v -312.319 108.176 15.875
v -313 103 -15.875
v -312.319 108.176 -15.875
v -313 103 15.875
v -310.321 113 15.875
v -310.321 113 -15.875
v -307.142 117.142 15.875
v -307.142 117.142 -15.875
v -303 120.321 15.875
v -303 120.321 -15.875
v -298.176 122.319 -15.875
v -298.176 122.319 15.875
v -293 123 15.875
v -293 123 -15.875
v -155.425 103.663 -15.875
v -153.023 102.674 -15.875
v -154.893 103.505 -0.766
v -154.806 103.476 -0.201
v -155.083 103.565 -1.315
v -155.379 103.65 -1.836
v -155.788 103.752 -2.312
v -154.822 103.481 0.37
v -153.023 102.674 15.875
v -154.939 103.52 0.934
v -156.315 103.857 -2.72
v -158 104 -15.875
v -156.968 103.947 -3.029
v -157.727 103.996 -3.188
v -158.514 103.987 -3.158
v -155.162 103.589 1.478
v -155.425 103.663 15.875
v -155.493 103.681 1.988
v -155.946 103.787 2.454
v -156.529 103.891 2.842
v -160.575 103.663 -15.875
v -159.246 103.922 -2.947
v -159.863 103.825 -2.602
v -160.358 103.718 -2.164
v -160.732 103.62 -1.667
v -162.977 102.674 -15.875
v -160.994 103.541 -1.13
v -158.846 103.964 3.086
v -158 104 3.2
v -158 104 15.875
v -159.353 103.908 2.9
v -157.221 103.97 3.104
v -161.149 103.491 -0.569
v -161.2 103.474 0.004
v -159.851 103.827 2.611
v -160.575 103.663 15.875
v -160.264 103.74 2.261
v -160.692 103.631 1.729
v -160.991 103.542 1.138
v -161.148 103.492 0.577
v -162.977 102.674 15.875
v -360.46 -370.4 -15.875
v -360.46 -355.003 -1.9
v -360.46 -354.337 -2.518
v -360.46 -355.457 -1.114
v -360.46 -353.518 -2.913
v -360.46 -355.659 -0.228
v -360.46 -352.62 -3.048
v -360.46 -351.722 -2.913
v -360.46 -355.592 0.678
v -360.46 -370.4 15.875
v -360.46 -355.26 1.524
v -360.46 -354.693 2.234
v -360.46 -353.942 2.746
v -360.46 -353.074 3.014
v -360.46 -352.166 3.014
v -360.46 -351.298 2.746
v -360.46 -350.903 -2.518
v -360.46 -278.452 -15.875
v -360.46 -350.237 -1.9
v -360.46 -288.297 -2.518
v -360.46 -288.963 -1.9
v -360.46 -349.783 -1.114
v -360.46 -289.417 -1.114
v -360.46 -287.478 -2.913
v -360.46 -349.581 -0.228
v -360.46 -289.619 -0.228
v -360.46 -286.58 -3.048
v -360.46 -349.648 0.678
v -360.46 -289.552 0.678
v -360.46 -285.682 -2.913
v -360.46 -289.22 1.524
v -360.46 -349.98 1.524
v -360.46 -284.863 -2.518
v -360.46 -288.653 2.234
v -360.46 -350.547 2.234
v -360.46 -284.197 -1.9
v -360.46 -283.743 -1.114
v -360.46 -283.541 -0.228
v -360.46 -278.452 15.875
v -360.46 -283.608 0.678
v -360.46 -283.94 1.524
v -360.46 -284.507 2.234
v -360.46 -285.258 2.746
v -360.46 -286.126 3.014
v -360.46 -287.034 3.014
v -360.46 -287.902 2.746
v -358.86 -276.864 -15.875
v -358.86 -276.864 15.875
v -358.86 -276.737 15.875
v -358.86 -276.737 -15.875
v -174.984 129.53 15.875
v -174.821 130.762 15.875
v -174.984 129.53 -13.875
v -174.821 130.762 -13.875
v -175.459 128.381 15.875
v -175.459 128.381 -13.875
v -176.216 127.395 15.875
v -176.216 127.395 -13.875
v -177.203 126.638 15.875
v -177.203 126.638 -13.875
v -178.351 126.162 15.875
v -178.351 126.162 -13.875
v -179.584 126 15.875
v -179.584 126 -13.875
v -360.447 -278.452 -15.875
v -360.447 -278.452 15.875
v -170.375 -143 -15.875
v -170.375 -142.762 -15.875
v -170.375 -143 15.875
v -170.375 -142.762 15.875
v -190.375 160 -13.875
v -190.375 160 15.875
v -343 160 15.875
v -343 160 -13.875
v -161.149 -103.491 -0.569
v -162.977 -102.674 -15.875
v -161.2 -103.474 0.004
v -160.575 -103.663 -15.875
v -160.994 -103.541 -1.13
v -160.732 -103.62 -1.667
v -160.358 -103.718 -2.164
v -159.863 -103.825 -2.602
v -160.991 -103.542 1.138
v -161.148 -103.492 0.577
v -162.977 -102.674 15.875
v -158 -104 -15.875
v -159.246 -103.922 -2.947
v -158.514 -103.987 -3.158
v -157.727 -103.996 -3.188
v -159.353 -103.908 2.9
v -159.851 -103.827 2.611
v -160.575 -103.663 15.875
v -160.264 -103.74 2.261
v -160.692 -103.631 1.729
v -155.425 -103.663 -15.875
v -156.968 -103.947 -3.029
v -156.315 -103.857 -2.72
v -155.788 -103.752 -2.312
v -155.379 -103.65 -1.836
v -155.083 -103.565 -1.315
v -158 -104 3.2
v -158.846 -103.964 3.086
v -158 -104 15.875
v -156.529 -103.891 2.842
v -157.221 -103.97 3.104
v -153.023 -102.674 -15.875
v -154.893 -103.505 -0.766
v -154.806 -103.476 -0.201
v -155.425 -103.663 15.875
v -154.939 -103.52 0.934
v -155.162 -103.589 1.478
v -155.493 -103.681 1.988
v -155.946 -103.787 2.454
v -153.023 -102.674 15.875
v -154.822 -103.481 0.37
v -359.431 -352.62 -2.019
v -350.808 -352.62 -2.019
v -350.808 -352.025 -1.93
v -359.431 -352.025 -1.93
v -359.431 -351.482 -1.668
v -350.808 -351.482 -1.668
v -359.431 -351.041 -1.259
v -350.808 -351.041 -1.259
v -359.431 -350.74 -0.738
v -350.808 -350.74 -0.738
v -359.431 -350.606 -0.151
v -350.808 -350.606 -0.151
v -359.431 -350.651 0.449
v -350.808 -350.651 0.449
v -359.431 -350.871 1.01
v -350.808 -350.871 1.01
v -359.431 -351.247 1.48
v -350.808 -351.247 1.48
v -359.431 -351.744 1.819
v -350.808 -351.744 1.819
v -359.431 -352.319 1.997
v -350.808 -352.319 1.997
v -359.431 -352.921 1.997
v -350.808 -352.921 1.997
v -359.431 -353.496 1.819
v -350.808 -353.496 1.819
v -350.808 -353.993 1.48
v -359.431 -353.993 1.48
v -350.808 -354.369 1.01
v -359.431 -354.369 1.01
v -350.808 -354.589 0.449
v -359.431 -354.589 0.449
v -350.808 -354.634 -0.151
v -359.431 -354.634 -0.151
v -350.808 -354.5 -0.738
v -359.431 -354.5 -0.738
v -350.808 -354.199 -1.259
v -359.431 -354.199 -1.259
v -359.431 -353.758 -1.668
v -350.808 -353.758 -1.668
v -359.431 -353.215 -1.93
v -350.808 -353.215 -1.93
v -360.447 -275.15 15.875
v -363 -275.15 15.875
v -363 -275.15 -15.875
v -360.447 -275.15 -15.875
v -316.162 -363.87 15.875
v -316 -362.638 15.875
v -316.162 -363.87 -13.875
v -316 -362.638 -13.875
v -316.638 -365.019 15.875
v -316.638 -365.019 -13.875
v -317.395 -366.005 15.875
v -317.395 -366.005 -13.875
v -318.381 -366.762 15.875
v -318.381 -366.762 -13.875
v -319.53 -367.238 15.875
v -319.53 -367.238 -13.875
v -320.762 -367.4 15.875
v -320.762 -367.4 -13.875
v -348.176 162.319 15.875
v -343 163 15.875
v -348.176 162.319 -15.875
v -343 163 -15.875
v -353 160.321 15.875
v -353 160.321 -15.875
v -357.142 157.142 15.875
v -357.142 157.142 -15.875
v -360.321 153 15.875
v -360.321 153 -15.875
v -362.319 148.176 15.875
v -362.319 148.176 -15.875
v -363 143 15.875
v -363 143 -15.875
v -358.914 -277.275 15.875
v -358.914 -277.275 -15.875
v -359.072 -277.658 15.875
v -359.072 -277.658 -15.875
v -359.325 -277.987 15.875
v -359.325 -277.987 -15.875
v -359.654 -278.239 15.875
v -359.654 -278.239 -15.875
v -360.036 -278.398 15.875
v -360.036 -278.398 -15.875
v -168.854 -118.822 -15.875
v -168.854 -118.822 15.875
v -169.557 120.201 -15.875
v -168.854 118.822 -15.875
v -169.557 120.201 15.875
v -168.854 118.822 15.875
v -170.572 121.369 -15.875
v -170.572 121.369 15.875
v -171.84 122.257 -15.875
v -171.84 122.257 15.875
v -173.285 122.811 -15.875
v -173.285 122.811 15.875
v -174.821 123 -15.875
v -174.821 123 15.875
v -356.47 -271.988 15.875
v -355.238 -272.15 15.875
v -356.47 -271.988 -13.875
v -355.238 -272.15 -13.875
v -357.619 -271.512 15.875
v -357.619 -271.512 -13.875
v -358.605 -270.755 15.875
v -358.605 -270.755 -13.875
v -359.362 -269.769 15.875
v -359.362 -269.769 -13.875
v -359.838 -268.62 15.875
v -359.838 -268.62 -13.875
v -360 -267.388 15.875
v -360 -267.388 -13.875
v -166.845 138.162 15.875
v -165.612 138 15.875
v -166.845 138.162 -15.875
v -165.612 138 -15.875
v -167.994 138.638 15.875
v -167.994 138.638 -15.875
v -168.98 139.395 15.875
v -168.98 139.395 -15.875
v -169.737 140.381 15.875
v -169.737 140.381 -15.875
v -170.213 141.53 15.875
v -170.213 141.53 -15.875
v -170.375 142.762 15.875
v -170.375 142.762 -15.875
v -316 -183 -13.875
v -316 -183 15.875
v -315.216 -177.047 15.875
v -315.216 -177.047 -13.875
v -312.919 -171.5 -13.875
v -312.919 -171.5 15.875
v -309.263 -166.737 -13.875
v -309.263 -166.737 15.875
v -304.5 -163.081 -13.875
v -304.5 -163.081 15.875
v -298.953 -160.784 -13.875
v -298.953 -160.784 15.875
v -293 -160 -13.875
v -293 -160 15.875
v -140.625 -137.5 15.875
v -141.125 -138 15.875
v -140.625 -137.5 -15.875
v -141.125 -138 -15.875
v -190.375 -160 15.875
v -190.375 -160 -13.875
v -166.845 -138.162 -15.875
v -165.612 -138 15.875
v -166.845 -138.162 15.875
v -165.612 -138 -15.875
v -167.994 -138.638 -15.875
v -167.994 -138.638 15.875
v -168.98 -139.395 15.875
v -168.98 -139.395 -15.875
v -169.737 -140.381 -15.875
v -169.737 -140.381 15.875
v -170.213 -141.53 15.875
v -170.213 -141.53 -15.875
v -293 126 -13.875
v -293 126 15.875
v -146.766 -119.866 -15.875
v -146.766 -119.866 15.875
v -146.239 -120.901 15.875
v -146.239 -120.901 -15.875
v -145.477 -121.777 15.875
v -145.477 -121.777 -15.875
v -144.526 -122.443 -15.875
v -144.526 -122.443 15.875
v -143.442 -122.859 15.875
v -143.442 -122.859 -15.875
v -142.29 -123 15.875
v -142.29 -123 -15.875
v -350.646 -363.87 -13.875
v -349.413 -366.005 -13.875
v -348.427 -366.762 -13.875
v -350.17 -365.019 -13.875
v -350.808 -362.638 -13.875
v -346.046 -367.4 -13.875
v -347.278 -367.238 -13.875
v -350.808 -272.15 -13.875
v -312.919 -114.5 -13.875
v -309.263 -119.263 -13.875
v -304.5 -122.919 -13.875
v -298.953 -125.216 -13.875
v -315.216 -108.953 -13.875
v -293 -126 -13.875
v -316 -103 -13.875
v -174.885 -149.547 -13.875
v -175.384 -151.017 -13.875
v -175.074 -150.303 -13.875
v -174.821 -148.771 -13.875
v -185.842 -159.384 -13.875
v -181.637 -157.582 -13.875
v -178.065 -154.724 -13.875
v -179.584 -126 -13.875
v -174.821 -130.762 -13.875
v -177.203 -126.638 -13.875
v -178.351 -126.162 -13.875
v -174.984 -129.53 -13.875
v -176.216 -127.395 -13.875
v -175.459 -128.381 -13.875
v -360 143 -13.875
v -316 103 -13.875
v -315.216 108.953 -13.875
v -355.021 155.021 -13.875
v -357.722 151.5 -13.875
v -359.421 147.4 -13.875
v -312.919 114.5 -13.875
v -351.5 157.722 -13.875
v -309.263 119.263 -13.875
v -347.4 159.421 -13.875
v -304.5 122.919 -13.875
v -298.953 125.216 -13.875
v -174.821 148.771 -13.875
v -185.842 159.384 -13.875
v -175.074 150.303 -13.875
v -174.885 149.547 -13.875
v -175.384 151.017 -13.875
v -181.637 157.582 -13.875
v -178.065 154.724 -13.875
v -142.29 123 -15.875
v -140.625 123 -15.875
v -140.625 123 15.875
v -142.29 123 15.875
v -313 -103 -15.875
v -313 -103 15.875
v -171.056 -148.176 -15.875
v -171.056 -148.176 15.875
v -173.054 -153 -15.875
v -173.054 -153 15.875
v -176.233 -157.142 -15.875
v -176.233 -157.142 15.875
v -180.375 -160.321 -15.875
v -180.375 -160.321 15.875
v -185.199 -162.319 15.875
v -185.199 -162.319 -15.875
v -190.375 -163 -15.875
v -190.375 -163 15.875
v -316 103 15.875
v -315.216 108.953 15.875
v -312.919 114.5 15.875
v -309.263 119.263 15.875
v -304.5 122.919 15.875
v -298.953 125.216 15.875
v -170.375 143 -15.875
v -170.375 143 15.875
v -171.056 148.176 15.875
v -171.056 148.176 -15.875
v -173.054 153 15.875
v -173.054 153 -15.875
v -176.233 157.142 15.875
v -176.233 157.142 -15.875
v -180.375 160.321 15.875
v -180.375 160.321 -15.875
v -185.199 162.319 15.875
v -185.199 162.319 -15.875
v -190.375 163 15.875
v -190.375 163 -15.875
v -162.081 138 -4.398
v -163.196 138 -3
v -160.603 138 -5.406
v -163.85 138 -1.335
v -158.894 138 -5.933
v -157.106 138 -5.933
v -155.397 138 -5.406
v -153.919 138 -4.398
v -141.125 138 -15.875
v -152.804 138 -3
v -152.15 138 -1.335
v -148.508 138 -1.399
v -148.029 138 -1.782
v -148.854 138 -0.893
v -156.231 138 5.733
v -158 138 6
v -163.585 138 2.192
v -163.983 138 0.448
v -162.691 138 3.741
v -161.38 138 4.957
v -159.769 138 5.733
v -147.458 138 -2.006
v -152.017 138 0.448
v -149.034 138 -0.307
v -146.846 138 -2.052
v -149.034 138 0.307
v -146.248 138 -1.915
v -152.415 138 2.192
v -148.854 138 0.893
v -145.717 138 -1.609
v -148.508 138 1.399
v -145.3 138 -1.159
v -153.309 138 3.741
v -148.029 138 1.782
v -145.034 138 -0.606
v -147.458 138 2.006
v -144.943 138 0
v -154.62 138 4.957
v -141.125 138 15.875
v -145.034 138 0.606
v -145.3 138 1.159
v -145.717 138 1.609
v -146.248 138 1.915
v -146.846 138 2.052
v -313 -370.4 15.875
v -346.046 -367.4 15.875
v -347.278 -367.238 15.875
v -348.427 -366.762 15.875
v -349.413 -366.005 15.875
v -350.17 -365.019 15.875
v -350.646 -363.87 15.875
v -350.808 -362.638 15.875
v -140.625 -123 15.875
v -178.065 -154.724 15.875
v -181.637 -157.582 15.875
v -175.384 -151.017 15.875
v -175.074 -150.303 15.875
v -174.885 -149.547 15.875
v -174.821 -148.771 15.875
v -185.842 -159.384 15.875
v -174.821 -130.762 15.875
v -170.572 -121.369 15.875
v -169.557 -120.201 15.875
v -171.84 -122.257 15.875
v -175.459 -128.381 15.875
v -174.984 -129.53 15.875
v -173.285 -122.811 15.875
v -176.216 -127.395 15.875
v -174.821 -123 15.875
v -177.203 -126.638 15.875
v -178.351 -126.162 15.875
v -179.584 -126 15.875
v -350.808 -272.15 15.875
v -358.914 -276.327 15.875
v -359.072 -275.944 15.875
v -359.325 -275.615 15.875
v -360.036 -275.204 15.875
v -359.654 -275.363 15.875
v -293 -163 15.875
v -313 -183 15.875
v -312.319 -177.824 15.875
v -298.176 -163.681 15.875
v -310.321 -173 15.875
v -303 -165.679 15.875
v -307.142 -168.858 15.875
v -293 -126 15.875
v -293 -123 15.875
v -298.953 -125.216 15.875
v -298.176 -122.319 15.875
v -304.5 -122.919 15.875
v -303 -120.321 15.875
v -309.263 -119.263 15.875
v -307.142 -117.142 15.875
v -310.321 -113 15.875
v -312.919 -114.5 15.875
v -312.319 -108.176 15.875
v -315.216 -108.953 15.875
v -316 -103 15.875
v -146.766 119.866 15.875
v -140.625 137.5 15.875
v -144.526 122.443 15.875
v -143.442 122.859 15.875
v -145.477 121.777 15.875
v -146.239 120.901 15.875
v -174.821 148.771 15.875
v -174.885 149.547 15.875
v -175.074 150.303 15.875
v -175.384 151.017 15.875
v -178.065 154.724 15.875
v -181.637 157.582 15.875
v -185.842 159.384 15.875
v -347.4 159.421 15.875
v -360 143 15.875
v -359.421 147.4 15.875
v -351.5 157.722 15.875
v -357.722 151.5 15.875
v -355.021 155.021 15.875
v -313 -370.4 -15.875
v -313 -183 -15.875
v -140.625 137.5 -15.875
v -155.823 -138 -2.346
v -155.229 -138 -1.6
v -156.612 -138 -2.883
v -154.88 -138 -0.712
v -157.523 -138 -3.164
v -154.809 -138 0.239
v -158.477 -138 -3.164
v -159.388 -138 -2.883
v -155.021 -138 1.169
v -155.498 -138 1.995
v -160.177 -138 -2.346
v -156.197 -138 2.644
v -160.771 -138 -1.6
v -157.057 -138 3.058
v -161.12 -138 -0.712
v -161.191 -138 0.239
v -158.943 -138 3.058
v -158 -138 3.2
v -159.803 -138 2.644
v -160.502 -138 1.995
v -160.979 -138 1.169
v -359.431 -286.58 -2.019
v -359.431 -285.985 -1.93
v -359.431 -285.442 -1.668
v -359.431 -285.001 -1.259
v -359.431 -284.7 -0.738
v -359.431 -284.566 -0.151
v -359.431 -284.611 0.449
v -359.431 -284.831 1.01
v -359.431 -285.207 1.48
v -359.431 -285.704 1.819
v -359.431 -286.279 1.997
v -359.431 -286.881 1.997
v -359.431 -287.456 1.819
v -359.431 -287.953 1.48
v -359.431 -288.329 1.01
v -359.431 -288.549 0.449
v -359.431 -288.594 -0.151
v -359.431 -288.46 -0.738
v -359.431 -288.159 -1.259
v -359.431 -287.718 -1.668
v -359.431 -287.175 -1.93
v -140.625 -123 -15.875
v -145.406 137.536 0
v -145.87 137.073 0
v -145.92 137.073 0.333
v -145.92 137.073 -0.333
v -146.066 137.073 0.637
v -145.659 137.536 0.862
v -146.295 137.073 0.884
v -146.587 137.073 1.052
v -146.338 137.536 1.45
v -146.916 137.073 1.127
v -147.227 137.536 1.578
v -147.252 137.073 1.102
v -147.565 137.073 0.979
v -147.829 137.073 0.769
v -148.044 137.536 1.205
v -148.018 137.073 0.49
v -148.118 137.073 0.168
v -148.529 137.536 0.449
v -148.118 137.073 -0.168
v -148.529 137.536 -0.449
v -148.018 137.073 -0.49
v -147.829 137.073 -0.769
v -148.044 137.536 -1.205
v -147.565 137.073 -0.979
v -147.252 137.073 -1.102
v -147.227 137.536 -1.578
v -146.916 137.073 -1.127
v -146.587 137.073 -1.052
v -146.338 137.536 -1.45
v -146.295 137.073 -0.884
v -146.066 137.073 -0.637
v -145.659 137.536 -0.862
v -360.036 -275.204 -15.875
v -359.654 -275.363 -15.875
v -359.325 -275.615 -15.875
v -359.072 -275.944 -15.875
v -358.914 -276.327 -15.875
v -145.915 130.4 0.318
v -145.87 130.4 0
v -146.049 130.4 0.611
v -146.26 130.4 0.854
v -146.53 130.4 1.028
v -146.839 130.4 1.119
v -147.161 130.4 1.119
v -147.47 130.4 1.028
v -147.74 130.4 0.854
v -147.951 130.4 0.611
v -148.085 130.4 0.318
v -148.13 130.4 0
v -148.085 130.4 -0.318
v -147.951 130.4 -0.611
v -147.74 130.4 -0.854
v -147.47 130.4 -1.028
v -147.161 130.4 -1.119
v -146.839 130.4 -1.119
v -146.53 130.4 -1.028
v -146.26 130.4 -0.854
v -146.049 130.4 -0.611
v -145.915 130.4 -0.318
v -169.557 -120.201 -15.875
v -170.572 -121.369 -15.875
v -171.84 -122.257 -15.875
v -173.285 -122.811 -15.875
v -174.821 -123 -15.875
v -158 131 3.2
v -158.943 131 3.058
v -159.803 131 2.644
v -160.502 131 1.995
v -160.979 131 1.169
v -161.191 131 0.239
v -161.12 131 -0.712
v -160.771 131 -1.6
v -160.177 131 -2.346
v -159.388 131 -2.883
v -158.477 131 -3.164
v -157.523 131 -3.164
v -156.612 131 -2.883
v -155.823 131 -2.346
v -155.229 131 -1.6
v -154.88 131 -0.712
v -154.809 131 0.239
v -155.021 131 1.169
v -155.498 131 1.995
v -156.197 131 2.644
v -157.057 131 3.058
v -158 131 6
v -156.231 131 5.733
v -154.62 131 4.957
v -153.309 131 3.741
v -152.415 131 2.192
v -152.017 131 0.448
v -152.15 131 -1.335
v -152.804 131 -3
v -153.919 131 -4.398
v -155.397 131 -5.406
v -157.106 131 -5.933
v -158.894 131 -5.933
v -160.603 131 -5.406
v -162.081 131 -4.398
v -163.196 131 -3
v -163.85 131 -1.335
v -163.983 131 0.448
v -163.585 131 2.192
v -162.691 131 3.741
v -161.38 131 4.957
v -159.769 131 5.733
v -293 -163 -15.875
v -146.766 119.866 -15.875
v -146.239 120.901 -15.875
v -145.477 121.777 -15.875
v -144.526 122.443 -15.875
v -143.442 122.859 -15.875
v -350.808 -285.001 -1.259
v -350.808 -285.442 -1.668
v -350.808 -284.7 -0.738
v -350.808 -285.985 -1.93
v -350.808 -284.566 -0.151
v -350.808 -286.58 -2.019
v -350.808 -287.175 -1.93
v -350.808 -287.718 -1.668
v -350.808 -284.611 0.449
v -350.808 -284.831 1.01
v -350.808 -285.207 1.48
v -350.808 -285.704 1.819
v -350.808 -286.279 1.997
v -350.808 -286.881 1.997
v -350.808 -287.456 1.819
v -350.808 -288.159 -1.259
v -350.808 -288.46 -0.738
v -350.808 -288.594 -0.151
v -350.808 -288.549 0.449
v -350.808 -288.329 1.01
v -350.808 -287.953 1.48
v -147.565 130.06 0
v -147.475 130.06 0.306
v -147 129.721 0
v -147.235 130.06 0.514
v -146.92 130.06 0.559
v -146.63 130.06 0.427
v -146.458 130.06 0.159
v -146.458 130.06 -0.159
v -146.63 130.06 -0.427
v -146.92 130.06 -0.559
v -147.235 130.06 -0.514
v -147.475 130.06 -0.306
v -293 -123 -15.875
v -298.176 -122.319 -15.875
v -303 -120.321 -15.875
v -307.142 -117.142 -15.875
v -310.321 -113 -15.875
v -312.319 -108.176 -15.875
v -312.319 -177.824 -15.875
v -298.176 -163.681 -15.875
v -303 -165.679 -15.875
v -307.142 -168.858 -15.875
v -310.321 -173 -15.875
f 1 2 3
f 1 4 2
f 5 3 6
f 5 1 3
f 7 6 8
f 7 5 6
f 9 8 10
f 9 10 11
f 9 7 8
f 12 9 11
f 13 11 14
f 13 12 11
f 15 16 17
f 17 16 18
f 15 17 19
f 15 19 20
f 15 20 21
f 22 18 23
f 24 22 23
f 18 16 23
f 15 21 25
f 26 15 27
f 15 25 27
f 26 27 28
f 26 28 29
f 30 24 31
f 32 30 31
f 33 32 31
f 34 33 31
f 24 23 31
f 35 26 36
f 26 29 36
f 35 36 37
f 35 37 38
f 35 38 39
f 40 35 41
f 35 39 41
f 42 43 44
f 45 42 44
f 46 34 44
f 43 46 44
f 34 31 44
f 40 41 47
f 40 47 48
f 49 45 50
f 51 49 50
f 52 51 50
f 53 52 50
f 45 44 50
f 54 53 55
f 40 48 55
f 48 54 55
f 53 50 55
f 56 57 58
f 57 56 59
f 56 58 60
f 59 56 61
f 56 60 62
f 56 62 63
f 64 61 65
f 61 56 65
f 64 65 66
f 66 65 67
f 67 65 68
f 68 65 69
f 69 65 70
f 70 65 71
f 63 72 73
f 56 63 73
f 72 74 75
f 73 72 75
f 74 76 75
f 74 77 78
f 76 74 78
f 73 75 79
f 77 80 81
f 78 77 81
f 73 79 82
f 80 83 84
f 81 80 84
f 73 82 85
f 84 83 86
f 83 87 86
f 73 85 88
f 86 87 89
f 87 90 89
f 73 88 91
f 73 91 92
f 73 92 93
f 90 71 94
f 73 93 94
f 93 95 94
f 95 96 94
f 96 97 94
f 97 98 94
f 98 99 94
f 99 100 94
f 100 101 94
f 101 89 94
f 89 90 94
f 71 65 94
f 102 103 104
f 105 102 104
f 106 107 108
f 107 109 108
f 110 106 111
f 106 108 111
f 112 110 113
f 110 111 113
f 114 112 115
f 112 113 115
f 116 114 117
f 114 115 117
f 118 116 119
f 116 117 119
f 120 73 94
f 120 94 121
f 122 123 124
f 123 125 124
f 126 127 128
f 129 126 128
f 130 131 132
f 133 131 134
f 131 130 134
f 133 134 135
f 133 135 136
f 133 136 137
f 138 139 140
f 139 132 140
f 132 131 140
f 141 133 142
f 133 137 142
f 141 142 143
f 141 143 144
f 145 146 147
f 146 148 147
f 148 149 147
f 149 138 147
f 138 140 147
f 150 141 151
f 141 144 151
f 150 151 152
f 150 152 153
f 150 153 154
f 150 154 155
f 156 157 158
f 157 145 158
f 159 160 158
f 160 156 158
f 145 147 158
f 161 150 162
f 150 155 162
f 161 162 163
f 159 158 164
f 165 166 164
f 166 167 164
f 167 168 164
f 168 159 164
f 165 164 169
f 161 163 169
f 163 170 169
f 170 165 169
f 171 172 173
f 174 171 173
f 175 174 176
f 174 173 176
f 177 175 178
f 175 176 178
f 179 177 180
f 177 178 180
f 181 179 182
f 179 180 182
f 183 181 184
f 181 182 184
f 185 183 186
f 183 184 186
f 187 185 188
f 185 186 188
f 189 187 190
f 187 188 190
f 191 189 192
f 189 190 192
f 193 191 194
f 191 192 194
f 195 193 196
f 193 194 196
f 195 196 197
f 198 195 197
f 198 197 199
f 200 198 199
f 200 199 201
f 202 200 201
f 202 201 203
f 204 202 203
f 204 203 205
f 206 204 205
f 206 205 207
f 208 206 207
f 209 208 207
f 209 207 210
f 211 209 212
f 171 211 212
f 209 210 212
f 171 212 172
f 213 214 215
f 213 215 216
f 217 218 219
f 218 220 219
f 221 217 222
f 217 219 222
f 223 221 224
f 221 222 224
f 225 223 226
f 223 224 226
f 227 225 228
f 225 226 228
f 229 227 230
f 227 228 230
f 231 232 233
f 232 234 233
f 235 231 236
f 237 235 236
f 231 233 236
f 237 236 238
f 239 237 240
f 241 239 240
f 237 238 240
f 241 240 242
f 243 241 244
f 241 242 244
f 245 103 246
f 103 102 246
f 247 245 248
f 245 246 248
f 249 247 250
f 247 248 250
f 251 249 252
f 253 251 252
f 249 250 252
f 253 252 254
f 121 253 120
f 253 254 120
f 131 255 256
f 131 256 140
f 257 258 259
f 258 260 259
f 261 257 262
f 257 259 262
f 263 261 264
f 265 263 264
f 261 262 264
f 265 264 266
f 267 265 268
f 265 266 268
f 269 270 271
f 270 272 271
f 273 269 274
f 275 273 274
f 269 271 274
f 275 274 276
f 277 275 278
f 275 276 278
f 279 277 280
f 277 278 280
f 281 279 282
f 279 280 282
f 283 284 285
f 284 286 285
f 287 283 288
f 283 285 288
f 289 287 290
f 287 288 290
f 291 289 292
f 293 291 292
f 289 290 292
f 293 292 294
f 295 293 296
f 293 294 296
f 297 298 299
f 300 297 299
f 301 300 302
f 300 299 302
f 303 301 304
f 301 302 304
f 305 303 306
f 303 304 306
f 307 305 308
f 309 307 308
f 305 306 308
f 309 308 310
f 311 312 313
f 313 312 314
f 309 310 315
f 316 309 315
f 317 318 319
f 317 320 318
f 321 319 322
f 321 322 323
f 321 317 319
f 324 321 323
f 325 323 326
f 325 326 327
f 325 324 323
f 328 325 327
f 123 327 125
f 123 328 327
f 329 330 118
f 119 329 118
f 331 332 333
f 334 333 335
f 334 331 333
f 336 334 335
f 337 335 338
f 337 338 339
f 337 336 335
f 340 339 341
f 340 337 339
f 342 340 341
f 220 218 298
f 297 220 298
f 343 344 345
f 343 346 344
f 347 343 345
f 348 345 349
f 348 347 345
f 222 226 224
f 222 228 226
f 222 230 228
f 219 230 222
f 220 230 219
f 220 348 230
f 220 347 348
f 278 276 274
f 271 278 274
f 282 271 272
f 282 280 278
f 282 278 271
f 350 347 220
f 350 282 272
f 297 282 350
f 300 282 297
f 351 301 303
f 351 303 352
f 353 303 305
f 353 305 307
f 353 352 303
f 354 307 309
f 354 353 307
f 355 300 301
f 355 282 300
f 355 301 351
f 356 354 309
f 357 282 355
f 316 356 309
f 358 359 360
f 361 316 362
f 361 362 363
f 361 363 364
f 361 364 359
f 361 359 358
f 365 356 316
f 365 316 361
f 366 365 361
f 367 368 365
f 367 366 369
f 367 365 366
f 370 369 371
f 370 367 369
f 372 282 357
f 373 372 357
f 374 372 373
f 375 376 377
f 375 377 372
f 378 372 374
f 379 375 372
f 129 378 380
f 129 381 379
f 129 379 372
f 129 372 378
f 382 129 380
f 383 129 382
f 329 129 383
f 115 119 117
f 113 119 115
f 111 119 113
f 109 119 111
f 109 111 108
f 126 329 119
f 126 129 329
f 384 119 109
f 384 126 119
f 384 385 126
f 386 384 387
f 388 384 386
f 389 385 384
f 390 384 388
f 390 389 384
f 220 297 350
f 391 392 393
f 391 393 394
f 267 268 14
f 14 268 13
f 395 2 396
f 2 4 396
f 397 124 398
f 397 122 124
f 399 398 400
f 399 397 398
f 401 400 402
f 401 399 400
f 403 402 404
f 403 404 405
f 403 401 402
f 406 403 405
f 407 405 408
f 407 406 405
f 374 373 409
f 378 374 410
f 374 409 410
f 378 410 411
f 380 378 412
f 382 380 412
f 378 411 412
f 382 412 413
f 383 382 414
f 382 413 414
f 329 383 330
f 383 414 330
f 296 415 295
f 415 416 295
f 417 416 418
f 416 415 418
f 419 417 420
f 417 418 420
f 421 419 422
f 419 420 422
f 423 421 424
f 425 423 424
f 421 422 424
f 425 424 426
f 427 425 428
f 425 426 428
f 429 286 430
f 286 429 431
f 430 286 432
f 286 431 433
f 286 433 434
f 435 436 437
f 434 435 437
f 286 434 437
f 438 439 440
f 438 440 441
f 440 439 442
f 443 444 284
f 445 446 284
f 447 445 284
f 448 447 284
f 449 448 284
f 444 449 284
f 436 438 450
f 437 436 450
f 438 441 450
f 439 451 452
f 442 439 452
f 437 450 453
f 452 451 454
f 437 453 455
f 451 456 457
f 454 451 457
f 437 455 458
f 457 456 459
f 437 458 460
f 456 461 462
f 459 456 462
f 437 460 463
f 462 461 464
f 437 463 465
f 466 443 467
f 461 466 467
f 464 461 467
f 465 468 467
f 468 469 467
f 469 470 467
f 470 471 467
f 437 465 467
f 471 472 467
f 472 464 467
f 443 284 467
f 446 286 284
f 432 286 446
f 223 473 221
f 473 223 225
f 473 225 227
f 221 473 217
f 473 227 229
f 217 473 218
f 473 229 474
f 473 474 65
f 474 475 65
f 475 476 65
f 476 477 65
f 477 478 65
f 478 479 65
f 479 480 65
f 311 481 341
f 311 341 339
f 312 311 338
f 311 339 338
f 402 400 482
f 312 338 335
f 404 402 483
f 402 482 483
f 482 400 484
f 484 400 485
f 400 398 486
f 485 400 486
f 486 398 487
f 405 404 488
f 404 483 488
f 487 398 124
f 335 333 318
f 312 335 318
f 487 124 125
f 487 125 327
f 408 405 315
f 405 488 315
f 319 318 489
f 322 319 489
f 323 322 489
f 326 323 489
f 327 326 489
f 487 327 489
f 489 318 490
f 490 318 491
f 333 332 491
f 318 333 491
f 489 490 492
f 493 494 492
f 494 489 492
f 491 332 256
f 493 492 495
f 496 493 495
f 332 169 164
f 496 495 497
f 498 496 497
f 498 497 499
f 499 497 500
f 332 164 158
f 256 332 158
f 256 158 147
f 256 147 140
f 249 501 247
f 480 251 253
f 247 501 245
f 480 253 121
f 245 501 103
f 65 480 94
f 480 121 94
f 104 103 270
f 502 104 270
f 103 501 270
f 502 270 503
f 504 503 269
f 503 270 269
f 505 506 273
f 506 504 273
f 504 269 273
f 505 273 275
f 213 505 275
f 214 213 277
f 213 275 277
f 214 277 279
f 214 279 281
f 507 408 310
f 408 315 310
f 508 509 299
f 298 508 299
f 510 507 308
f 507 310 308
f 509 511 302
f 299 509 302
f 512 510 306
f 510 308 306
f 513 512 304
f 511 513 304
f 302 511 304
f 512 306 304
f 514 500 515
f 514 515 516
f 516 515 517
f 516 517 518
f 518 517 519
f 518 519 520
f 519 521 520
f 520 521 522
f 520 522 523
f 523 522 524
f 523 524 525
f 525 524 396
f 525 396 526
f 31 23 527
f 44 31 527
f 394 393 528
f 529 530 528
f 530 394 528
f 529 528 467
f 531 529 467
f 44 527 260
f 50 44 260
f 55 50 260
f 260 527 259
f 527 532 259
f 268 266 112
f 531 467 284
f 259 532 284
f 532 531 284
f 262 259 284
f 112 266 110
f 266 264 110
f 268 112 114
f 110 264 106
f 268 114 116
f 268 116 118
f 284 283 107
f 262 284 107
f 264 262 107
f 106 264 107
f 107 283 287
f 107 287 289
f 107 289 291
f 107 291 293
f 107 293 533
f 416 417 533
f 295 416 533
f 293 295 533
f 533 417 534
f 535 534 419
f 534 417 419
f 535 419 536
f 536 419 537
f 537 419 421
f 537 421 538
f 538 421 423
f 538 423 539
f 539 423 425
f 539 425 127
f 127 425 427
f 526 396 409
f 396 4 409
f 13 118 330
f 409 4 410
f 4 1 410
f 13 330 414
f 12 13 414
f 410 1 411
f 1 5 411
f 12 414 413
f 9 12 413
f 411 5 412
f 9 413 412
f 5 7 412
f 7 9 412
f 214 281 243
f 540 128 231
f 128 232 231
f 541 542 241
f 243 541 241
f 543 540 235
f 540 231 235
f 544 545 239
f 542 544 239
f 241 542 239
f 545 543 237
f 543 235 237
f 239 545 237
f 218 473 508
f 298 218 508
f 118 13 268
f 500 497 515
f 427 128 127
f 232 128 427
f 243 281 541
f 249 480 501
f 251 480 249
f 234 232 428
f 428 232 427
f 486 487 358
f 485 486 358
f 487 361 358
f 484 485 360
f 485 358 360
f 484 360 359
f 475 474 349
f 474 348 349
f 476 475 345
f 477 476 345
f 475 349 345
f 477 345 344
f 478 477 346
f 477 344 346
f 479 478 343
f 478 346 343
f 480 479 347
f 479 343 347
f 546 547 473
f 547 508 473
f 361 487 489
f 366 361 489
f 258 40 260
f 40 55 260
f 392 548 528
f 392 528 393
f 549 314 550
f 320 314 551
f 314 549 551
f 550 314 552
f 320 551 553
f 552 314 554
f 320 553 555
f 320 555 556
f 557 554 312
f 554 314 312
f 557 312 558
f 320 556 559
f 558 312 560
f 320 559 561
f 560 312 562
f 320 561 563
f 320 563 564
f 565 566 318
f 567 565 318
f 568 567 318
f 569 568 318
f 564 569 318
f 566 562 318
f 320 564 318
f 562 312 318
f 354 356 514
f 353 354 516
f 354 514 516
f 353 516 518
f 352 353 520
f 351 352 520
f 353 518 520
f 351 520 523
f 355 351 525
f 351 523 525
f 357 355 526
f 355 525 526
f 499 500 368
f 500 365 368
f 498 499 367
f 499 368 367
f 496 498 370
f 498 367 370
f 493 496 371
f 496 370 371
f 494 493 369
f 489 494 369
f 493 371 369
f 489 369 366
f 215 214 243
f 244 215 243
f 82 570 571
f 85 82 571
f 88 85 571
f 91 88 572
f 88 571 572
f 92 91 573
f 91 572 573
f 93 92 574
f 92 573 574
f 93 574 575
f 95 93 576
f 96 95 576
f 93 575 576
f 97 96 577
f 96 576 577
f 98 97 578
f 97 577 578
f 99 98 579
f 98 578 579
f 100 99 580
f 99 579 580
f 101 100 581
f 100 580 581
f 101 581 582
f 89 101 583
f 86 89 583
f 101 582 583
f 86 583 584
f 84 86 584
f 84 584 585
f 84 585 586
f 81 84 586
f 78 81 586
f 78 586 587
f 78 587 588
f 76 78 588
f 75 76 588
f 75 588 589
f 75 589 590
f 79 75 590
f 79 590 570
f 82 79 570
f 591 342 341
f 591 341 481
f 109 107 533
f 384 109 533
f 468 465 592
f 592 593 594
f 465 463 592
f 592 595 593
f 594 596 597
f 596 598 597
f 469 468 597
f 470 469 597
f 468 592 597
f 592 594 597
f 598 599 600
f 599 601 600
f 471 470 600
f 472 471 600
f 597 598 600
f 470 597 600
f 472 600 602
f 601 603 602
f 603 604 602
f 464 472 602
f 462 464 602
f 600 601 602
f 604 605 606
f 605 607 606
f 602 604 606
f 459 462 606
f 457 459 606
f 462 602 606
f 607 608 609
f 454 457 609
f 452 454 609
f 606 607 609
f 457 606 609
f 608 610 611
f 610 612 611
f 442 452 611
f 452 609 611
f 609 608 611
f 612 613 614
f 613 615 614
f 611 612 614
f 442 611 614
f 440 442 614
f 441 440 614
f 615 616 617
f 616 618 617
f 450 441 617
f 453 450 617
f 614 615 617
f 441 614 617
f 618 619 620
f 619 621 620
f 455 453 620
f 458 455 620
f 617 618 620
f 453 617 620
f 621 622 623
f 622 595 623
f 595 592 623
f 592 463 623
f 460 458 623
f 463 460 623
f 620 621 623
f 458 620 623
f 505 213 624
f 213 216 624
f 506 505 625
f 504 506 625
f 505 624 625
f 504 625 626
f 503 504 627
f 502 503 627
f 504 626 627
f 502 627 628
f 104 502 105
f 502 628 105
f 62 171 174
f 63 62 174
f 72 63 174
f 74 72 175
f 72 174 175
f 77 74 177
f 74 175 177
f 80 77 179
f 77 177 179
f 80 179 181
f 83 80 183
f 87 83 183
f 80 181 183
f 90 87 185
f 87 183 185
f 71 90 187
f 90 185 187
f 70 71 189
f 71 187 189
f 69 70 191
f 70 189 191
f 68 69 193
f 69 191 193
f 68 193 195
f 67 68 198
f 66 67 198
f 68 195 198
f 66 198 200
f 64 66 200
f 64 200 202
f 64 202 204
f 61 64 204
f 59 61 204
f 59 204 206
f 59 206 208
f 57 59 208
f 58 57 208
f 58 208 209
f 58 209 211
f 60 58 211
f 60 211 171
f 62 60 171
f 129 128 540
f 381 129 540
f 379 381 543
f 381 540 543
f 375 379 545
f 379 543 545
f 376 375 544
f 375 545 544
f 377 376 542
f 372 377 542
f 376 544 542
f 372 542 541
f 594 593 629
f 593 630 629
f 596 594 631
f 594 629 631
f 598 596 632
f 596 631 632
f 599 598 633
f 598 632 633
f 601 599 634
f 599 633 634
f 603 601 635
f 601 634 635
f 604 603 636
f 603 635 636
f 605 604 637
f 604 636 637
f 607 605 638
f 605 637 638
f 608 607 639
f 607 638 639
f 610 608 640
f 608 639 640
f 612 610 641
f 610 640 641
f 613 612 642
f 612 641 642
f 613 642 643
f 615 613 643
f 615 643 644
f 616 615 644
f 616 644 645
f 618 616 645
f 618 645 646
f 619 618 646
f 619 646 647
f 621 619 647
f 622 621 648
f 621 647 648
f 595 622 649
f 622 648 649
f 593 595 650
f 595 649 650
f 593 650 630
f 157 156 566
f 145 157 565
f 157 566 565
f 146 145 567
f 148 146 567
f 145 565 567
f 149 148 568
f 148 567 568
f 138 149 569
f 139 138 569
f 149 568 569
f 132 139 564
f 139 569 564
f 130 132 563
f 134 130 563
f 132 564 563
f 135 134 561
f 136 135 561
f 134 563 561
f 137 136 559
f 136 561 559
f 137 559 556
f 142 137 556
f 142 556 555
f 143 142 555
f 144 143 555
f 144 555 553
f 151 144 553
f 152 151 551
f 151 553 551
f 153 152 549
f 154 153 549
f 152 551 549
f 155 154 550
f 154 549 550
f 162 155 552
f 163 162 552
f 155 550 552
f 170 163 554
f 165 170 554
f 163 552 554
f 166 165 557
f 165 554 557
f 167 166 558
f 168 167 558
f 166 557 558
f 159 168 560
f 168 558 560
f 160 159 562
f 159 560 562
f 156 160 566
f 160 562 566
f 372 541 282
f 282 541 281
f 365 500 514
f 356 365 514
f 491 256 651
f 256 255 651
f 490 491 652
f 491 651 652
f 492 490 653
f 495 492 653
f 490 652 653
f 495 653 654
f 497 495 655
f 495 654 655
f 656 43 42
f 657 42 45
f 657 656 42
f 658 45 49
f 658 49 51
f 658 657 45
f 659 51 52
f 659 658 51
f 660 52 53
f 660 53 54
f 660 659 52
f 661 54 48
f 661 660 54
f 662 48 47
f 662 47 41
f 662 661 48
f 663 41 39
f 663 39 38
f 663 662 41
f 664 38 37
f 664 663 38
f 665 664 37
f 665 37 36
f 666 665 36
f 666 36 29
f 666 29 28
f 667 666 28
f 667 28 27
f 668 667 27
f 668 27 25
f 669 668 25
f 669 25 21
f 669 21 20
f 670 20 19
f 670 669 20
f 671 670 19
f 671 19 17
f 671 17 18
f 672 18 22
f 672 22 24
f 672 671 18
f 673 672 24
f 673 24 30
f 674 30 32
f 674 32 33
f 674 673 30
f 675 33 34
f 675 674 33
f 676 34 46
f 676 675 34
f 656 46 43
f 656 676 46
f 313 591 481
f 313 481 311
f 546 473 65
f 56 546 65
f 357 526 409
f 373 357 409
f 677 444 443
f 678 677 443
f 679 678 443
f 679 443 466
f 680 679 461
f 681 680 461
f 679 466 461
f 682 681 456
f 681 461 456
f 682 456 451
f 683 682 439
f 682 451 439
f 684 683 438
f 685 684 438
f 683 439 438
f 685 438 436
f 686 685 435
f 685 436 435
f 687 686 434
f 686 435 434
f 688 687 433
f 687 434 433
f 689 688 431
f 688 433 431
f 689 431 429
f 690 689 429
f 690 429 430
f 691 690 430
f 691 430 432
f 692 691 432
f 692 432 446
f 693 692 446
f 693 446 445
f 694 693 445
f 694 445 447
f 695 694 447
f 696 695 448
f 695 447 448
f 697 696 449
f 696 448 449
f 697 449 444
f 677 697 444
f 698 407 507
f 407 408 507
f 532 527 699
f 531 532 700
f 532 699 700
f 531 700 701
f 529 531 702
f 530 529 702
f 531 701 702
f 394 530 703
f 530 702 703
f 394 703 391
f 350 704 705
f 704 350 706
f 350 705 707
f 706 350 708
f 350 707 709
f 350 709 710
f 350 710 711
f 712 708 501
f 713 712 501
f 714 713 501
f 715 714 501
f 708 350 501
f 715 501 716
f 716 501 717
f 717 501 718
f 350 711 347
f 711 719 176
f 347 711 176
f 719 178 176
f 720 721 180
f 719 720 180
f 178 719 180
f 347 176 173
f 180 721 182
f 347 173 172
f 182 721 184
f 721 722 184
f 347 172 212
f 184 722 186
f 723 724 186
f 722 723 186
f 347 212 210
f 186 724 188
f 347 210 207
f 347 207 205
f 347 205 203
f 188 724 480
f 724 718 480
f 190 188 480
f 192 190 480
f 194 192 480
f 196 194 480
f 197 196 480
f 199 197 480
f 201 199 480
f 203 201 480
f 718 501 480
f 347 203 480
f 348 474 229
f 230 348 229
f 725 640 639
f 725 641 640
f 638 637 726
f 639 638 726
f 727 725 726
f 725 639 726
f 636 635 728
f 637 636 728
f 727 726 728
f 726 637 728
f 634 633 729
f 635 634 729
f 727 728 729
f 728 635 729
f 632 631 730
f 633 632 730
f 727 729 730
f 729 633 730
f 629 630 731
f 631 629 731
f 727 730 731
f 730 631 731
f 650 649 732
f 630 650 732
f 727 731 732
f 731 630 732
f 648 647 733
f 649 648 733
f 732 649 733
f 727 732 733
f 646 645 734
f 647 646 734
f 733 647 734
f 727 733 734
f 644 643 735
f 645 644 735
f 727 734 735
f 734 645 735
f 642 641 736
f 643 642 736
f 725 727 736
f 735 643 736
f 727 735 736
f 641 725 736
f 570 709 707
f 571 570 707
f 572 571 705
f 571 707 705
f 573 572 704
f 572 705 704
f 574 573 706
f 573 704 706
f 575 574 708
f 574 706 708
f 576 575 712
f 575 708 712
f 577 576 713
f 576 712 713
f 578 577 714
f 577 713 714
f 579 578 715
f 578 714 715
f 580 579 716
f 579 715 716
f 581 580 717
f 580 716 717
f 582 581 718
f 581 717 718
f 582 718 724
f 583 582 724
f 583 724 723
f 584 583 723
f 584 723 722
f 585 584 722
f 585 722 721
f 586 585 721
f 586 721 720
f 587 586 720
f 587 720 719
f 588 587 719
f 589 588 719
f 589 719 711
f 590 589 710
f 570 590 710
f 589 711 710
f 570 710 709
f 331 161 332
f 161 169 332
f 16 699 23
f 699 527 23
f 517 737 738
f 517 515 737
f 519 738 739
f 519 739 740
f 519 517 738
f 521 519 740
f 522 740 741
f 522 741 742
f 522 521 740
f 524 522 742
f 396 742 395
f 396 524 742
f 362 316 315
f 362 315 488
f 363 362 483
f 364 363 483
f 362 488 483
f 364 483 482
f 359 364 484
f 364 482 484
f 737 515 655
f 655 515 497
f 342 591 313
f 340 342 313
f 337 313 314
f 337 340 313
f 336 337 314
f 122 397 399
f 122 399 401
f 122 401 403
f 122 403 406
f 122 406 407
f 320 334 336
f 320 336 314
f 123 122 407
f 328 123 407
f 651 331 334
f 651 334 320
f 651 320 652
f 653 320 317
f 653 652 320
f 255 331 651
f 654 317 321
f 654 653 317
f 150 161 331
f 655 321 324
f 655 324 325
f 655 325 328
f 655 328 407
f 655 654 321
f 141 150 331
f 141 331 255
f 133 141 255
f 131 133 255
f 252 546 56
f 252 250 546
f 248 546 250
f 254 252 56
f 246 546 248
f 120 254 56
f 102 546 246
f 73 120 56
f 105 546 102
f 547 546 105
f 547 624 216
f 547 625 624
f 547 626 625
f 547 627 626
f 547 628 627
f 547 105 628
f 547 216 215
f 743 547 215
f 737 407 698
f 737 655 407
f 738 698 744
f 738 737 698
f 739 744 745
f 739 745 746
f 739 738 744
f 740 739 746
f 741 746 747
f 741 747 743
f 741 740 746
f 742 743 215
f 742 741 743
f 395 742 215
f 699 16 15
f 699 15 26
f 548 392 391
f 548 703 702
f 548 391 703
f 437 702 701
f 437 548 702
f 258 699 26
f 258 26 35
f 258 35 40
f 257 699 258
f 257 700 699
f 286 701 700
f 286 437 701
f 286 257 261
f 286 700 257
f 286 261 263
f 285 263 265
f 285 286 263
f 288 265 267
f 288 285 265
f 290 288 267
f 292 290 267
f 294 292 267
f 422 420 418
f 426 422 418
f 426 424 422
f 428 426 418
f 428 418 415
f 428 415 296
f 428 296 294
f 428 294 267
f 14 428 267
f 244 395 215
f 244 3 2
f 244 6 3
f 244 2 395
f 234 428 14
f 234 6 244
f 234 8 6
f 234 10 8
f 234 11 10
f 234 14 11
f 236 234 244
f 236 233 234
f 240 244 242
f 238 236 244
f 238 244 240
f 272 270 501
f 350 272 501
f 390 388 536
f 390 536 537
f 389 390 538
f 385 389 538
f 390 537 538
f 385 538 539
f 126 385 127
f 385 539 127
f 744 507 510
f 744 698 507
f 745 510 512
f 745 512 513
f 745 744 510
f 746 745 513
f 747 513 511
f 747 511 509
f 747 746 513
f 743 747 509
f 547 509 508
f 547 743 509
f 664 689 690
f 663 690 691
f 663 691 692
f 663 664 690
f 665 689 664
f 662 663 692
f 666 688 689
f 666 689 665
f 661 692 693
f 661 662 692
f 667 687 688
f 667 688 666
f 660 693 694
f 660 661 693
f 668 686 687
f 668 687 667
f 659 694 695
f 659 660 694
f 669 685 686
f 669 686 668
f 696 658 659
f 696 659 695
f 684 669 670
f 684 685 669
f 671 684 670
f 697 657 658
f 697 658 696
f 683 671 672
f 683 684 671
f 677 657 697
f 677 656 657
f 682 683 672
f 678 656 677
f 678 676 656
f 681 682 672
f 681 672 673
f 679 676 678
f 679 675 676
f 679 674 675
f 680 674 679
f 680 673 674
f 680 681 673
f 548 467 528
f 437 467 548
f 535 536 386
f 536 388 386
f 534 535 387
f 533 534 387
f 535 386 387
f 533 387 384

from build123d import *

# Parameters (mm, degrees)
BOSS_EXTRUDE1_DEPTH              = 15.875
SKETCH13_W                       = 2.54
SKETCH13_H                       = 95.25
CUT_EXTRUDE2_DEPTH               = 32.75
SKETCH14_W                       = 1.6002
SKETCH14_H                       = 3.302
CUT_EXTRUDE3_DEPTH               = 32.75
FILLET4_R                        = 1.5875
FILLET1_R                        = 6.35
FILLET2_R                        = 20
FILLET3_R                        = 4.7625
SKETCH10_R                       = 6
CUT_EXTRUDE1_DEPTH               = 7
F_4_40_TAPPED_HOLE1_D            = 2.2606
F_4_40_TAPPED_HOLE1_DEPTH        = 7.6
F_4_40_TAPPED_HOLE1_CSINK_D      = 4.1148
F_4_40_TAPPED_HOLE1_CSINK_ANGLE  = 90
F_4_40_TAPPED_HOLE1_TIP          = 0.679152758
CHAMFER1_SIZE                    = 0.5
F_10_32_TAPPED_HOLE1_D           = 4.0386
F_10_32_TAPPED_HOLE1_DEPTH       = 12.03
F_10_32_TAPPED_HOLE1_CSINK_D     = 6.096
F_10_32_TAPPED_HOLE1_CSINK_ANGLE = 90
F_10_32_TAPPED_HOLE1_TIP         = 1.213317848
CUT_EXTRUDE7_DEPTH               = 29.75
FILLET5_R                        = 4.7625


with BuildPart() as part:
    # Sketch1 → Boss-Extrude1 (new body, symmetric)
    with BuildSketch(Plane.XY):
        with BuildLine():
            Line((-313, -123), (-176.364963641, -123))
            Line((-176.364963641, -123), (-170.374987965, -123))
            Line((-170.374987965, -123), (-162.97678843, -102.673613833))
            ThreePointArc((-162.97678843, -102.673613833), (-158, -104), (-153.02321157, -102.673613833))
            Line((-153.02321157, -102.673613833), (-145.625012035, -123))
            Line((-145.625012035, -123), (-140.625012035, -123))
            Line((-140.625012035, -123), (-140.625012035, -138))
            Line((-140.625012035, -138), (-145.625012035, -138))
            Line((-145.625012035, -138), (-170.374987965, -138))
            Line((-170.374987965, -138), (-170.374987965, -163))
            Line((-170.374987965, -163), (-313, -163))
            Line((-313, -163), (-313, -370.4))
            Line((-313, -370.4), (-363, -370.4))
            Line((-363, -370.4), (-363, -163))
            Line((-363, -163), (-363, 163))
            Line((-363, 163), (-170.374987965, 163))
            Line((-170.374987965, 163), (-170.374987965, 138))
            Line((-170.374987965, 138), (-145.625012035, 138))
            Line((-145.625012035, 138), (-140.625012035, 138))
            Line((-140.625012035, 138), (-140.625012035, 123))
            Line((-140.625012035, 123), (-145.625012035, 123))
            Line((-145.625012035, 123), (-153.02321157, 102.673613833))
            ThreePointArc((-153.02321157, 102.673613833), (-158, 104), (-162.97678843, 102.673613833))
            Line((-162.97678843, 102.673613833), (-170.374987965, 123))
            Line((-170.374987965, 123), (-176.364963641, 123))
            Line((-176.364963641, 123), (-313, 123))
            Line((-313, 123), (-313, -123))
        make_face()
    extrude(amount=BOSS_EXTRUDE1_DEPTH, both=True)

    # Sketch13 → Cut-Extrude2 (cut, through all)
    with BuildSketch(Plane.XY.offset(15.875)):
        with Locations((-361.73, -322.775)):
            Rectangle(SKETCH13_W, SKETCH13_H)
    extrude(amount=-CUT_EXTRUDE2_DEPTH, mode=Mode.SUBTRACT)

    # Sketch14 → Cut-Extrude3 (cut, through all)
    with BuildSketch(Plane.XY.offset(15.875)):
        with Locations((-359.6599, -276.801)):
            Rectangle(SKETCH14_W, SKETCH14_H)
    extrude(amount=-CUT_EXTRUDE3_DEPTH, mode=Mode.SUBTRACT)

    # Fillet4
    fillet4_edges = [part.edges().sort_by_distance(p)[0] for p in [
        (-358.8598, -275.15, 0),
        (-358.8598, -278.452, 0),
    ]]
    fillet(fillet4_edges, radius=FILLET4_R)

    # Fillet1
    fillet1_edges = [part.edges().sort_by_distance(p)[0] for p in [
        (-170.374987965, -123, 0),
        (-170.374987965, 123, 0),
    ]]
    fillet(fillet1_edges, radius=FILLET1_R)

    # Fillet2
    fillet2_edges = [part.edges().sort_by_distance(p)[0] for p in [
        (-313, 123, 0),
        (-313, -123, 0),
        (-170.374987965, -163, 0),
        (-313, -163, 0),
        (-363, 163, 0),
        (-170.374987965, 163, 0),
    ]]
    fillet(fillet2_edges, radius=FILLET2_R)

    # Fillet3
    fillet3_edges = [part.edges().sort_by_distance(p)[0] for p in [
        (-145.625012035, -123, 0),
        (-170.374987965, -138, 0),
        (-170.374987965, 138, 0),
        (-145.625012035, 123, 0),
    ]]
    fillet(fillet3_edges, radius=FILLET3_R)

    # Sketch8 → M6 Clearance Hole1 (revolve, cut)
    with BuildSketch(Plane(origin=(-158, 138, 0), x_dir=(0, 0, 1), z_dir=(1, 0, 0))):
        Polygon((0, 0), (0, 51.960753981), (3.2, 50.038), (3.2, 0), align=None)
    m6_clearance_hole1 = revolve(axis=Axis((-158, 144.35, 0), (0, -1, 0)), mode=Mode.SUBTRACT)

    # Sketch10 → Cut-Extrude1 (cut)
    with BuildSketch(Plane(origin=(0, 138, 0), x_dir=(1, 0, 0), z_dir=(0, 1, 0))):
        with Locations(Location((-158, 0, 0), (0, 0, 270))):  # turned: the seam where the file's is
            Circle(SKETCH10_R)
    extrude(amount=-CUT_EXTRUDE1_DEPTH, mode=Mode.SUBTRACT)

    # #4-40 Tapped Hole1
    with Locations(Plane(origin=(0, 138, 0), x_dir=(-1, 0, 0), z_dir=(0, 1, 0))):
        with Locations((147, 0)):
            CounterSinkHole(F_4_40_TAPPED_HOLE1_D / 2, F_4_40_TAPPED_HOLE1_CSINK_D / 2, depth=F_4_40_TAPPED_HOLE1_DEPTH, counter_sink_angle=F_4_40_TAPPED_HOLE1_CSINK_ANGLE)
            with Locations((0, 0, -(F_4_40_TAPPED_HOLE1_DEPTH + F_4_40_TAPPED_HOLE1_TIP / 2))):  # 118° drill point
                Cone(0, F_4_40_TAPPED_HOLE1_D / 2, F_4_40_TAPPED_HOLE1_TIP, mode=Mode.SUBTRACT)

    # Mirror1: M6 Clearance Hole1 across plane
    add(m6_clearance_hole1.mirror(Plane.ZX), mode=Mode.SUBTRACT)

    # Chamfer1
    chamfer1_edges = [part.edges().sort_by_distance(p)[0] for p in [
        (-140.625012035, -138, 0),
        (-140.625012035, 138, 0),
    ]]
    chamfer(chamfer1_edges, length=CHAMFER1_SIZE)

    # #10-32 Tapped Hole1
    with Locations(Plane.ZY.offset(360.46)):
        with Locations((0, -286.58), (0, -352.62)):
            CounterSinkHole(F_10_32_TAPPED_HOLE1_D / 2, F_10_32_TAPPED_HOLE1_CSINK_D / 2, depth=F_10_32_TAPPED_HOLE1_DEPTH, counter_sink_angle=F_10_32_TAPPED_HOLE1_CSINK_ANGLE)
            with Locations((0, 0, -(F_10_32_TAPPED_HOLE1_DEPTH + F_10_32_TAPPED_HOLE1_TIP / 2))):  # 118° drill point
                Cone(0, F_10_32_TAPPED_HOLE1_D / 2, F_10_32_TAPPED_HOLE1_TIP, mode=Mode.SUBTRACT)

    # Sketch25 → Cut-Extrude7 (cut)
    with BuildSketch(Plane.XY.offset(15.875)):
        with BuildLine():
            Line((-190.374987965, 160), (-343, 160))
            ThreePointArc((-343, 160), (-355.02081528, 155.02081528), (-360, 143))
            Line((-360, 143), (-360, -272.15))
            Line((-360, -272.15), (-350.808, -272.15))
            Line((-350.808, -272.15), (-350.808, -367.4))
            Line((-350.808, -367.4), (-316, -367.4))
            Line((-316, -367.4), (-316, -183))
            ThreePointArc((-316, -183), (-309.263455967, -166.736544033), (-293, -160))
            Line((-293, -160), (-190.374987965, -160))
            ThreePointArc((-190.374987965, -160), (-181.091910782, -157.241645903), (-174.821305833, -149.861703296))
            Line((-174.821305833, -149.861703296), (-174.821305833, -126))
            Line((-174.821305833, -126), (-293, -126))
            ThreePointArc((-293, -126), (-309.263455967, -119.263455967), (-316, -103))
            Line((-316, -103), (-316, 103))
            ThreePointArc((-316, 103), (-309.263455967, 119.263455967), (-293, 126))
            Line((-293, 126), (-174.821305833, 126))
            Line((-174.821305833, 126), (-174.821305833, 149.861703296))
            ThreePointArc((-174.821305833, 149.861703296), (-181.091910782, 157.241645903), (-190.374987965, 160))
        make_face()
    extrude(amount=-CUT_EXTRUDE7_DEPTH, mode=Mode.SUBTRACT)

    # Fillet5
    fillet5_edges = [part.edges().sort_by_distance(p)[0] for p in [
        (-350.808, -367.4, 1),
        (-316, -367.4, 1),
        (-174.821305833, -149.861703296, 1),
        (-174.821305833, -126, 1),
        (-174.821305833, 126, 1),
        (-174.821305833, 149.861703296, 1),
        (-360, -272.15, 1),
    ]]
    fillet(fillet5_edges, radius=FILLET5_R)


solid = part.part
